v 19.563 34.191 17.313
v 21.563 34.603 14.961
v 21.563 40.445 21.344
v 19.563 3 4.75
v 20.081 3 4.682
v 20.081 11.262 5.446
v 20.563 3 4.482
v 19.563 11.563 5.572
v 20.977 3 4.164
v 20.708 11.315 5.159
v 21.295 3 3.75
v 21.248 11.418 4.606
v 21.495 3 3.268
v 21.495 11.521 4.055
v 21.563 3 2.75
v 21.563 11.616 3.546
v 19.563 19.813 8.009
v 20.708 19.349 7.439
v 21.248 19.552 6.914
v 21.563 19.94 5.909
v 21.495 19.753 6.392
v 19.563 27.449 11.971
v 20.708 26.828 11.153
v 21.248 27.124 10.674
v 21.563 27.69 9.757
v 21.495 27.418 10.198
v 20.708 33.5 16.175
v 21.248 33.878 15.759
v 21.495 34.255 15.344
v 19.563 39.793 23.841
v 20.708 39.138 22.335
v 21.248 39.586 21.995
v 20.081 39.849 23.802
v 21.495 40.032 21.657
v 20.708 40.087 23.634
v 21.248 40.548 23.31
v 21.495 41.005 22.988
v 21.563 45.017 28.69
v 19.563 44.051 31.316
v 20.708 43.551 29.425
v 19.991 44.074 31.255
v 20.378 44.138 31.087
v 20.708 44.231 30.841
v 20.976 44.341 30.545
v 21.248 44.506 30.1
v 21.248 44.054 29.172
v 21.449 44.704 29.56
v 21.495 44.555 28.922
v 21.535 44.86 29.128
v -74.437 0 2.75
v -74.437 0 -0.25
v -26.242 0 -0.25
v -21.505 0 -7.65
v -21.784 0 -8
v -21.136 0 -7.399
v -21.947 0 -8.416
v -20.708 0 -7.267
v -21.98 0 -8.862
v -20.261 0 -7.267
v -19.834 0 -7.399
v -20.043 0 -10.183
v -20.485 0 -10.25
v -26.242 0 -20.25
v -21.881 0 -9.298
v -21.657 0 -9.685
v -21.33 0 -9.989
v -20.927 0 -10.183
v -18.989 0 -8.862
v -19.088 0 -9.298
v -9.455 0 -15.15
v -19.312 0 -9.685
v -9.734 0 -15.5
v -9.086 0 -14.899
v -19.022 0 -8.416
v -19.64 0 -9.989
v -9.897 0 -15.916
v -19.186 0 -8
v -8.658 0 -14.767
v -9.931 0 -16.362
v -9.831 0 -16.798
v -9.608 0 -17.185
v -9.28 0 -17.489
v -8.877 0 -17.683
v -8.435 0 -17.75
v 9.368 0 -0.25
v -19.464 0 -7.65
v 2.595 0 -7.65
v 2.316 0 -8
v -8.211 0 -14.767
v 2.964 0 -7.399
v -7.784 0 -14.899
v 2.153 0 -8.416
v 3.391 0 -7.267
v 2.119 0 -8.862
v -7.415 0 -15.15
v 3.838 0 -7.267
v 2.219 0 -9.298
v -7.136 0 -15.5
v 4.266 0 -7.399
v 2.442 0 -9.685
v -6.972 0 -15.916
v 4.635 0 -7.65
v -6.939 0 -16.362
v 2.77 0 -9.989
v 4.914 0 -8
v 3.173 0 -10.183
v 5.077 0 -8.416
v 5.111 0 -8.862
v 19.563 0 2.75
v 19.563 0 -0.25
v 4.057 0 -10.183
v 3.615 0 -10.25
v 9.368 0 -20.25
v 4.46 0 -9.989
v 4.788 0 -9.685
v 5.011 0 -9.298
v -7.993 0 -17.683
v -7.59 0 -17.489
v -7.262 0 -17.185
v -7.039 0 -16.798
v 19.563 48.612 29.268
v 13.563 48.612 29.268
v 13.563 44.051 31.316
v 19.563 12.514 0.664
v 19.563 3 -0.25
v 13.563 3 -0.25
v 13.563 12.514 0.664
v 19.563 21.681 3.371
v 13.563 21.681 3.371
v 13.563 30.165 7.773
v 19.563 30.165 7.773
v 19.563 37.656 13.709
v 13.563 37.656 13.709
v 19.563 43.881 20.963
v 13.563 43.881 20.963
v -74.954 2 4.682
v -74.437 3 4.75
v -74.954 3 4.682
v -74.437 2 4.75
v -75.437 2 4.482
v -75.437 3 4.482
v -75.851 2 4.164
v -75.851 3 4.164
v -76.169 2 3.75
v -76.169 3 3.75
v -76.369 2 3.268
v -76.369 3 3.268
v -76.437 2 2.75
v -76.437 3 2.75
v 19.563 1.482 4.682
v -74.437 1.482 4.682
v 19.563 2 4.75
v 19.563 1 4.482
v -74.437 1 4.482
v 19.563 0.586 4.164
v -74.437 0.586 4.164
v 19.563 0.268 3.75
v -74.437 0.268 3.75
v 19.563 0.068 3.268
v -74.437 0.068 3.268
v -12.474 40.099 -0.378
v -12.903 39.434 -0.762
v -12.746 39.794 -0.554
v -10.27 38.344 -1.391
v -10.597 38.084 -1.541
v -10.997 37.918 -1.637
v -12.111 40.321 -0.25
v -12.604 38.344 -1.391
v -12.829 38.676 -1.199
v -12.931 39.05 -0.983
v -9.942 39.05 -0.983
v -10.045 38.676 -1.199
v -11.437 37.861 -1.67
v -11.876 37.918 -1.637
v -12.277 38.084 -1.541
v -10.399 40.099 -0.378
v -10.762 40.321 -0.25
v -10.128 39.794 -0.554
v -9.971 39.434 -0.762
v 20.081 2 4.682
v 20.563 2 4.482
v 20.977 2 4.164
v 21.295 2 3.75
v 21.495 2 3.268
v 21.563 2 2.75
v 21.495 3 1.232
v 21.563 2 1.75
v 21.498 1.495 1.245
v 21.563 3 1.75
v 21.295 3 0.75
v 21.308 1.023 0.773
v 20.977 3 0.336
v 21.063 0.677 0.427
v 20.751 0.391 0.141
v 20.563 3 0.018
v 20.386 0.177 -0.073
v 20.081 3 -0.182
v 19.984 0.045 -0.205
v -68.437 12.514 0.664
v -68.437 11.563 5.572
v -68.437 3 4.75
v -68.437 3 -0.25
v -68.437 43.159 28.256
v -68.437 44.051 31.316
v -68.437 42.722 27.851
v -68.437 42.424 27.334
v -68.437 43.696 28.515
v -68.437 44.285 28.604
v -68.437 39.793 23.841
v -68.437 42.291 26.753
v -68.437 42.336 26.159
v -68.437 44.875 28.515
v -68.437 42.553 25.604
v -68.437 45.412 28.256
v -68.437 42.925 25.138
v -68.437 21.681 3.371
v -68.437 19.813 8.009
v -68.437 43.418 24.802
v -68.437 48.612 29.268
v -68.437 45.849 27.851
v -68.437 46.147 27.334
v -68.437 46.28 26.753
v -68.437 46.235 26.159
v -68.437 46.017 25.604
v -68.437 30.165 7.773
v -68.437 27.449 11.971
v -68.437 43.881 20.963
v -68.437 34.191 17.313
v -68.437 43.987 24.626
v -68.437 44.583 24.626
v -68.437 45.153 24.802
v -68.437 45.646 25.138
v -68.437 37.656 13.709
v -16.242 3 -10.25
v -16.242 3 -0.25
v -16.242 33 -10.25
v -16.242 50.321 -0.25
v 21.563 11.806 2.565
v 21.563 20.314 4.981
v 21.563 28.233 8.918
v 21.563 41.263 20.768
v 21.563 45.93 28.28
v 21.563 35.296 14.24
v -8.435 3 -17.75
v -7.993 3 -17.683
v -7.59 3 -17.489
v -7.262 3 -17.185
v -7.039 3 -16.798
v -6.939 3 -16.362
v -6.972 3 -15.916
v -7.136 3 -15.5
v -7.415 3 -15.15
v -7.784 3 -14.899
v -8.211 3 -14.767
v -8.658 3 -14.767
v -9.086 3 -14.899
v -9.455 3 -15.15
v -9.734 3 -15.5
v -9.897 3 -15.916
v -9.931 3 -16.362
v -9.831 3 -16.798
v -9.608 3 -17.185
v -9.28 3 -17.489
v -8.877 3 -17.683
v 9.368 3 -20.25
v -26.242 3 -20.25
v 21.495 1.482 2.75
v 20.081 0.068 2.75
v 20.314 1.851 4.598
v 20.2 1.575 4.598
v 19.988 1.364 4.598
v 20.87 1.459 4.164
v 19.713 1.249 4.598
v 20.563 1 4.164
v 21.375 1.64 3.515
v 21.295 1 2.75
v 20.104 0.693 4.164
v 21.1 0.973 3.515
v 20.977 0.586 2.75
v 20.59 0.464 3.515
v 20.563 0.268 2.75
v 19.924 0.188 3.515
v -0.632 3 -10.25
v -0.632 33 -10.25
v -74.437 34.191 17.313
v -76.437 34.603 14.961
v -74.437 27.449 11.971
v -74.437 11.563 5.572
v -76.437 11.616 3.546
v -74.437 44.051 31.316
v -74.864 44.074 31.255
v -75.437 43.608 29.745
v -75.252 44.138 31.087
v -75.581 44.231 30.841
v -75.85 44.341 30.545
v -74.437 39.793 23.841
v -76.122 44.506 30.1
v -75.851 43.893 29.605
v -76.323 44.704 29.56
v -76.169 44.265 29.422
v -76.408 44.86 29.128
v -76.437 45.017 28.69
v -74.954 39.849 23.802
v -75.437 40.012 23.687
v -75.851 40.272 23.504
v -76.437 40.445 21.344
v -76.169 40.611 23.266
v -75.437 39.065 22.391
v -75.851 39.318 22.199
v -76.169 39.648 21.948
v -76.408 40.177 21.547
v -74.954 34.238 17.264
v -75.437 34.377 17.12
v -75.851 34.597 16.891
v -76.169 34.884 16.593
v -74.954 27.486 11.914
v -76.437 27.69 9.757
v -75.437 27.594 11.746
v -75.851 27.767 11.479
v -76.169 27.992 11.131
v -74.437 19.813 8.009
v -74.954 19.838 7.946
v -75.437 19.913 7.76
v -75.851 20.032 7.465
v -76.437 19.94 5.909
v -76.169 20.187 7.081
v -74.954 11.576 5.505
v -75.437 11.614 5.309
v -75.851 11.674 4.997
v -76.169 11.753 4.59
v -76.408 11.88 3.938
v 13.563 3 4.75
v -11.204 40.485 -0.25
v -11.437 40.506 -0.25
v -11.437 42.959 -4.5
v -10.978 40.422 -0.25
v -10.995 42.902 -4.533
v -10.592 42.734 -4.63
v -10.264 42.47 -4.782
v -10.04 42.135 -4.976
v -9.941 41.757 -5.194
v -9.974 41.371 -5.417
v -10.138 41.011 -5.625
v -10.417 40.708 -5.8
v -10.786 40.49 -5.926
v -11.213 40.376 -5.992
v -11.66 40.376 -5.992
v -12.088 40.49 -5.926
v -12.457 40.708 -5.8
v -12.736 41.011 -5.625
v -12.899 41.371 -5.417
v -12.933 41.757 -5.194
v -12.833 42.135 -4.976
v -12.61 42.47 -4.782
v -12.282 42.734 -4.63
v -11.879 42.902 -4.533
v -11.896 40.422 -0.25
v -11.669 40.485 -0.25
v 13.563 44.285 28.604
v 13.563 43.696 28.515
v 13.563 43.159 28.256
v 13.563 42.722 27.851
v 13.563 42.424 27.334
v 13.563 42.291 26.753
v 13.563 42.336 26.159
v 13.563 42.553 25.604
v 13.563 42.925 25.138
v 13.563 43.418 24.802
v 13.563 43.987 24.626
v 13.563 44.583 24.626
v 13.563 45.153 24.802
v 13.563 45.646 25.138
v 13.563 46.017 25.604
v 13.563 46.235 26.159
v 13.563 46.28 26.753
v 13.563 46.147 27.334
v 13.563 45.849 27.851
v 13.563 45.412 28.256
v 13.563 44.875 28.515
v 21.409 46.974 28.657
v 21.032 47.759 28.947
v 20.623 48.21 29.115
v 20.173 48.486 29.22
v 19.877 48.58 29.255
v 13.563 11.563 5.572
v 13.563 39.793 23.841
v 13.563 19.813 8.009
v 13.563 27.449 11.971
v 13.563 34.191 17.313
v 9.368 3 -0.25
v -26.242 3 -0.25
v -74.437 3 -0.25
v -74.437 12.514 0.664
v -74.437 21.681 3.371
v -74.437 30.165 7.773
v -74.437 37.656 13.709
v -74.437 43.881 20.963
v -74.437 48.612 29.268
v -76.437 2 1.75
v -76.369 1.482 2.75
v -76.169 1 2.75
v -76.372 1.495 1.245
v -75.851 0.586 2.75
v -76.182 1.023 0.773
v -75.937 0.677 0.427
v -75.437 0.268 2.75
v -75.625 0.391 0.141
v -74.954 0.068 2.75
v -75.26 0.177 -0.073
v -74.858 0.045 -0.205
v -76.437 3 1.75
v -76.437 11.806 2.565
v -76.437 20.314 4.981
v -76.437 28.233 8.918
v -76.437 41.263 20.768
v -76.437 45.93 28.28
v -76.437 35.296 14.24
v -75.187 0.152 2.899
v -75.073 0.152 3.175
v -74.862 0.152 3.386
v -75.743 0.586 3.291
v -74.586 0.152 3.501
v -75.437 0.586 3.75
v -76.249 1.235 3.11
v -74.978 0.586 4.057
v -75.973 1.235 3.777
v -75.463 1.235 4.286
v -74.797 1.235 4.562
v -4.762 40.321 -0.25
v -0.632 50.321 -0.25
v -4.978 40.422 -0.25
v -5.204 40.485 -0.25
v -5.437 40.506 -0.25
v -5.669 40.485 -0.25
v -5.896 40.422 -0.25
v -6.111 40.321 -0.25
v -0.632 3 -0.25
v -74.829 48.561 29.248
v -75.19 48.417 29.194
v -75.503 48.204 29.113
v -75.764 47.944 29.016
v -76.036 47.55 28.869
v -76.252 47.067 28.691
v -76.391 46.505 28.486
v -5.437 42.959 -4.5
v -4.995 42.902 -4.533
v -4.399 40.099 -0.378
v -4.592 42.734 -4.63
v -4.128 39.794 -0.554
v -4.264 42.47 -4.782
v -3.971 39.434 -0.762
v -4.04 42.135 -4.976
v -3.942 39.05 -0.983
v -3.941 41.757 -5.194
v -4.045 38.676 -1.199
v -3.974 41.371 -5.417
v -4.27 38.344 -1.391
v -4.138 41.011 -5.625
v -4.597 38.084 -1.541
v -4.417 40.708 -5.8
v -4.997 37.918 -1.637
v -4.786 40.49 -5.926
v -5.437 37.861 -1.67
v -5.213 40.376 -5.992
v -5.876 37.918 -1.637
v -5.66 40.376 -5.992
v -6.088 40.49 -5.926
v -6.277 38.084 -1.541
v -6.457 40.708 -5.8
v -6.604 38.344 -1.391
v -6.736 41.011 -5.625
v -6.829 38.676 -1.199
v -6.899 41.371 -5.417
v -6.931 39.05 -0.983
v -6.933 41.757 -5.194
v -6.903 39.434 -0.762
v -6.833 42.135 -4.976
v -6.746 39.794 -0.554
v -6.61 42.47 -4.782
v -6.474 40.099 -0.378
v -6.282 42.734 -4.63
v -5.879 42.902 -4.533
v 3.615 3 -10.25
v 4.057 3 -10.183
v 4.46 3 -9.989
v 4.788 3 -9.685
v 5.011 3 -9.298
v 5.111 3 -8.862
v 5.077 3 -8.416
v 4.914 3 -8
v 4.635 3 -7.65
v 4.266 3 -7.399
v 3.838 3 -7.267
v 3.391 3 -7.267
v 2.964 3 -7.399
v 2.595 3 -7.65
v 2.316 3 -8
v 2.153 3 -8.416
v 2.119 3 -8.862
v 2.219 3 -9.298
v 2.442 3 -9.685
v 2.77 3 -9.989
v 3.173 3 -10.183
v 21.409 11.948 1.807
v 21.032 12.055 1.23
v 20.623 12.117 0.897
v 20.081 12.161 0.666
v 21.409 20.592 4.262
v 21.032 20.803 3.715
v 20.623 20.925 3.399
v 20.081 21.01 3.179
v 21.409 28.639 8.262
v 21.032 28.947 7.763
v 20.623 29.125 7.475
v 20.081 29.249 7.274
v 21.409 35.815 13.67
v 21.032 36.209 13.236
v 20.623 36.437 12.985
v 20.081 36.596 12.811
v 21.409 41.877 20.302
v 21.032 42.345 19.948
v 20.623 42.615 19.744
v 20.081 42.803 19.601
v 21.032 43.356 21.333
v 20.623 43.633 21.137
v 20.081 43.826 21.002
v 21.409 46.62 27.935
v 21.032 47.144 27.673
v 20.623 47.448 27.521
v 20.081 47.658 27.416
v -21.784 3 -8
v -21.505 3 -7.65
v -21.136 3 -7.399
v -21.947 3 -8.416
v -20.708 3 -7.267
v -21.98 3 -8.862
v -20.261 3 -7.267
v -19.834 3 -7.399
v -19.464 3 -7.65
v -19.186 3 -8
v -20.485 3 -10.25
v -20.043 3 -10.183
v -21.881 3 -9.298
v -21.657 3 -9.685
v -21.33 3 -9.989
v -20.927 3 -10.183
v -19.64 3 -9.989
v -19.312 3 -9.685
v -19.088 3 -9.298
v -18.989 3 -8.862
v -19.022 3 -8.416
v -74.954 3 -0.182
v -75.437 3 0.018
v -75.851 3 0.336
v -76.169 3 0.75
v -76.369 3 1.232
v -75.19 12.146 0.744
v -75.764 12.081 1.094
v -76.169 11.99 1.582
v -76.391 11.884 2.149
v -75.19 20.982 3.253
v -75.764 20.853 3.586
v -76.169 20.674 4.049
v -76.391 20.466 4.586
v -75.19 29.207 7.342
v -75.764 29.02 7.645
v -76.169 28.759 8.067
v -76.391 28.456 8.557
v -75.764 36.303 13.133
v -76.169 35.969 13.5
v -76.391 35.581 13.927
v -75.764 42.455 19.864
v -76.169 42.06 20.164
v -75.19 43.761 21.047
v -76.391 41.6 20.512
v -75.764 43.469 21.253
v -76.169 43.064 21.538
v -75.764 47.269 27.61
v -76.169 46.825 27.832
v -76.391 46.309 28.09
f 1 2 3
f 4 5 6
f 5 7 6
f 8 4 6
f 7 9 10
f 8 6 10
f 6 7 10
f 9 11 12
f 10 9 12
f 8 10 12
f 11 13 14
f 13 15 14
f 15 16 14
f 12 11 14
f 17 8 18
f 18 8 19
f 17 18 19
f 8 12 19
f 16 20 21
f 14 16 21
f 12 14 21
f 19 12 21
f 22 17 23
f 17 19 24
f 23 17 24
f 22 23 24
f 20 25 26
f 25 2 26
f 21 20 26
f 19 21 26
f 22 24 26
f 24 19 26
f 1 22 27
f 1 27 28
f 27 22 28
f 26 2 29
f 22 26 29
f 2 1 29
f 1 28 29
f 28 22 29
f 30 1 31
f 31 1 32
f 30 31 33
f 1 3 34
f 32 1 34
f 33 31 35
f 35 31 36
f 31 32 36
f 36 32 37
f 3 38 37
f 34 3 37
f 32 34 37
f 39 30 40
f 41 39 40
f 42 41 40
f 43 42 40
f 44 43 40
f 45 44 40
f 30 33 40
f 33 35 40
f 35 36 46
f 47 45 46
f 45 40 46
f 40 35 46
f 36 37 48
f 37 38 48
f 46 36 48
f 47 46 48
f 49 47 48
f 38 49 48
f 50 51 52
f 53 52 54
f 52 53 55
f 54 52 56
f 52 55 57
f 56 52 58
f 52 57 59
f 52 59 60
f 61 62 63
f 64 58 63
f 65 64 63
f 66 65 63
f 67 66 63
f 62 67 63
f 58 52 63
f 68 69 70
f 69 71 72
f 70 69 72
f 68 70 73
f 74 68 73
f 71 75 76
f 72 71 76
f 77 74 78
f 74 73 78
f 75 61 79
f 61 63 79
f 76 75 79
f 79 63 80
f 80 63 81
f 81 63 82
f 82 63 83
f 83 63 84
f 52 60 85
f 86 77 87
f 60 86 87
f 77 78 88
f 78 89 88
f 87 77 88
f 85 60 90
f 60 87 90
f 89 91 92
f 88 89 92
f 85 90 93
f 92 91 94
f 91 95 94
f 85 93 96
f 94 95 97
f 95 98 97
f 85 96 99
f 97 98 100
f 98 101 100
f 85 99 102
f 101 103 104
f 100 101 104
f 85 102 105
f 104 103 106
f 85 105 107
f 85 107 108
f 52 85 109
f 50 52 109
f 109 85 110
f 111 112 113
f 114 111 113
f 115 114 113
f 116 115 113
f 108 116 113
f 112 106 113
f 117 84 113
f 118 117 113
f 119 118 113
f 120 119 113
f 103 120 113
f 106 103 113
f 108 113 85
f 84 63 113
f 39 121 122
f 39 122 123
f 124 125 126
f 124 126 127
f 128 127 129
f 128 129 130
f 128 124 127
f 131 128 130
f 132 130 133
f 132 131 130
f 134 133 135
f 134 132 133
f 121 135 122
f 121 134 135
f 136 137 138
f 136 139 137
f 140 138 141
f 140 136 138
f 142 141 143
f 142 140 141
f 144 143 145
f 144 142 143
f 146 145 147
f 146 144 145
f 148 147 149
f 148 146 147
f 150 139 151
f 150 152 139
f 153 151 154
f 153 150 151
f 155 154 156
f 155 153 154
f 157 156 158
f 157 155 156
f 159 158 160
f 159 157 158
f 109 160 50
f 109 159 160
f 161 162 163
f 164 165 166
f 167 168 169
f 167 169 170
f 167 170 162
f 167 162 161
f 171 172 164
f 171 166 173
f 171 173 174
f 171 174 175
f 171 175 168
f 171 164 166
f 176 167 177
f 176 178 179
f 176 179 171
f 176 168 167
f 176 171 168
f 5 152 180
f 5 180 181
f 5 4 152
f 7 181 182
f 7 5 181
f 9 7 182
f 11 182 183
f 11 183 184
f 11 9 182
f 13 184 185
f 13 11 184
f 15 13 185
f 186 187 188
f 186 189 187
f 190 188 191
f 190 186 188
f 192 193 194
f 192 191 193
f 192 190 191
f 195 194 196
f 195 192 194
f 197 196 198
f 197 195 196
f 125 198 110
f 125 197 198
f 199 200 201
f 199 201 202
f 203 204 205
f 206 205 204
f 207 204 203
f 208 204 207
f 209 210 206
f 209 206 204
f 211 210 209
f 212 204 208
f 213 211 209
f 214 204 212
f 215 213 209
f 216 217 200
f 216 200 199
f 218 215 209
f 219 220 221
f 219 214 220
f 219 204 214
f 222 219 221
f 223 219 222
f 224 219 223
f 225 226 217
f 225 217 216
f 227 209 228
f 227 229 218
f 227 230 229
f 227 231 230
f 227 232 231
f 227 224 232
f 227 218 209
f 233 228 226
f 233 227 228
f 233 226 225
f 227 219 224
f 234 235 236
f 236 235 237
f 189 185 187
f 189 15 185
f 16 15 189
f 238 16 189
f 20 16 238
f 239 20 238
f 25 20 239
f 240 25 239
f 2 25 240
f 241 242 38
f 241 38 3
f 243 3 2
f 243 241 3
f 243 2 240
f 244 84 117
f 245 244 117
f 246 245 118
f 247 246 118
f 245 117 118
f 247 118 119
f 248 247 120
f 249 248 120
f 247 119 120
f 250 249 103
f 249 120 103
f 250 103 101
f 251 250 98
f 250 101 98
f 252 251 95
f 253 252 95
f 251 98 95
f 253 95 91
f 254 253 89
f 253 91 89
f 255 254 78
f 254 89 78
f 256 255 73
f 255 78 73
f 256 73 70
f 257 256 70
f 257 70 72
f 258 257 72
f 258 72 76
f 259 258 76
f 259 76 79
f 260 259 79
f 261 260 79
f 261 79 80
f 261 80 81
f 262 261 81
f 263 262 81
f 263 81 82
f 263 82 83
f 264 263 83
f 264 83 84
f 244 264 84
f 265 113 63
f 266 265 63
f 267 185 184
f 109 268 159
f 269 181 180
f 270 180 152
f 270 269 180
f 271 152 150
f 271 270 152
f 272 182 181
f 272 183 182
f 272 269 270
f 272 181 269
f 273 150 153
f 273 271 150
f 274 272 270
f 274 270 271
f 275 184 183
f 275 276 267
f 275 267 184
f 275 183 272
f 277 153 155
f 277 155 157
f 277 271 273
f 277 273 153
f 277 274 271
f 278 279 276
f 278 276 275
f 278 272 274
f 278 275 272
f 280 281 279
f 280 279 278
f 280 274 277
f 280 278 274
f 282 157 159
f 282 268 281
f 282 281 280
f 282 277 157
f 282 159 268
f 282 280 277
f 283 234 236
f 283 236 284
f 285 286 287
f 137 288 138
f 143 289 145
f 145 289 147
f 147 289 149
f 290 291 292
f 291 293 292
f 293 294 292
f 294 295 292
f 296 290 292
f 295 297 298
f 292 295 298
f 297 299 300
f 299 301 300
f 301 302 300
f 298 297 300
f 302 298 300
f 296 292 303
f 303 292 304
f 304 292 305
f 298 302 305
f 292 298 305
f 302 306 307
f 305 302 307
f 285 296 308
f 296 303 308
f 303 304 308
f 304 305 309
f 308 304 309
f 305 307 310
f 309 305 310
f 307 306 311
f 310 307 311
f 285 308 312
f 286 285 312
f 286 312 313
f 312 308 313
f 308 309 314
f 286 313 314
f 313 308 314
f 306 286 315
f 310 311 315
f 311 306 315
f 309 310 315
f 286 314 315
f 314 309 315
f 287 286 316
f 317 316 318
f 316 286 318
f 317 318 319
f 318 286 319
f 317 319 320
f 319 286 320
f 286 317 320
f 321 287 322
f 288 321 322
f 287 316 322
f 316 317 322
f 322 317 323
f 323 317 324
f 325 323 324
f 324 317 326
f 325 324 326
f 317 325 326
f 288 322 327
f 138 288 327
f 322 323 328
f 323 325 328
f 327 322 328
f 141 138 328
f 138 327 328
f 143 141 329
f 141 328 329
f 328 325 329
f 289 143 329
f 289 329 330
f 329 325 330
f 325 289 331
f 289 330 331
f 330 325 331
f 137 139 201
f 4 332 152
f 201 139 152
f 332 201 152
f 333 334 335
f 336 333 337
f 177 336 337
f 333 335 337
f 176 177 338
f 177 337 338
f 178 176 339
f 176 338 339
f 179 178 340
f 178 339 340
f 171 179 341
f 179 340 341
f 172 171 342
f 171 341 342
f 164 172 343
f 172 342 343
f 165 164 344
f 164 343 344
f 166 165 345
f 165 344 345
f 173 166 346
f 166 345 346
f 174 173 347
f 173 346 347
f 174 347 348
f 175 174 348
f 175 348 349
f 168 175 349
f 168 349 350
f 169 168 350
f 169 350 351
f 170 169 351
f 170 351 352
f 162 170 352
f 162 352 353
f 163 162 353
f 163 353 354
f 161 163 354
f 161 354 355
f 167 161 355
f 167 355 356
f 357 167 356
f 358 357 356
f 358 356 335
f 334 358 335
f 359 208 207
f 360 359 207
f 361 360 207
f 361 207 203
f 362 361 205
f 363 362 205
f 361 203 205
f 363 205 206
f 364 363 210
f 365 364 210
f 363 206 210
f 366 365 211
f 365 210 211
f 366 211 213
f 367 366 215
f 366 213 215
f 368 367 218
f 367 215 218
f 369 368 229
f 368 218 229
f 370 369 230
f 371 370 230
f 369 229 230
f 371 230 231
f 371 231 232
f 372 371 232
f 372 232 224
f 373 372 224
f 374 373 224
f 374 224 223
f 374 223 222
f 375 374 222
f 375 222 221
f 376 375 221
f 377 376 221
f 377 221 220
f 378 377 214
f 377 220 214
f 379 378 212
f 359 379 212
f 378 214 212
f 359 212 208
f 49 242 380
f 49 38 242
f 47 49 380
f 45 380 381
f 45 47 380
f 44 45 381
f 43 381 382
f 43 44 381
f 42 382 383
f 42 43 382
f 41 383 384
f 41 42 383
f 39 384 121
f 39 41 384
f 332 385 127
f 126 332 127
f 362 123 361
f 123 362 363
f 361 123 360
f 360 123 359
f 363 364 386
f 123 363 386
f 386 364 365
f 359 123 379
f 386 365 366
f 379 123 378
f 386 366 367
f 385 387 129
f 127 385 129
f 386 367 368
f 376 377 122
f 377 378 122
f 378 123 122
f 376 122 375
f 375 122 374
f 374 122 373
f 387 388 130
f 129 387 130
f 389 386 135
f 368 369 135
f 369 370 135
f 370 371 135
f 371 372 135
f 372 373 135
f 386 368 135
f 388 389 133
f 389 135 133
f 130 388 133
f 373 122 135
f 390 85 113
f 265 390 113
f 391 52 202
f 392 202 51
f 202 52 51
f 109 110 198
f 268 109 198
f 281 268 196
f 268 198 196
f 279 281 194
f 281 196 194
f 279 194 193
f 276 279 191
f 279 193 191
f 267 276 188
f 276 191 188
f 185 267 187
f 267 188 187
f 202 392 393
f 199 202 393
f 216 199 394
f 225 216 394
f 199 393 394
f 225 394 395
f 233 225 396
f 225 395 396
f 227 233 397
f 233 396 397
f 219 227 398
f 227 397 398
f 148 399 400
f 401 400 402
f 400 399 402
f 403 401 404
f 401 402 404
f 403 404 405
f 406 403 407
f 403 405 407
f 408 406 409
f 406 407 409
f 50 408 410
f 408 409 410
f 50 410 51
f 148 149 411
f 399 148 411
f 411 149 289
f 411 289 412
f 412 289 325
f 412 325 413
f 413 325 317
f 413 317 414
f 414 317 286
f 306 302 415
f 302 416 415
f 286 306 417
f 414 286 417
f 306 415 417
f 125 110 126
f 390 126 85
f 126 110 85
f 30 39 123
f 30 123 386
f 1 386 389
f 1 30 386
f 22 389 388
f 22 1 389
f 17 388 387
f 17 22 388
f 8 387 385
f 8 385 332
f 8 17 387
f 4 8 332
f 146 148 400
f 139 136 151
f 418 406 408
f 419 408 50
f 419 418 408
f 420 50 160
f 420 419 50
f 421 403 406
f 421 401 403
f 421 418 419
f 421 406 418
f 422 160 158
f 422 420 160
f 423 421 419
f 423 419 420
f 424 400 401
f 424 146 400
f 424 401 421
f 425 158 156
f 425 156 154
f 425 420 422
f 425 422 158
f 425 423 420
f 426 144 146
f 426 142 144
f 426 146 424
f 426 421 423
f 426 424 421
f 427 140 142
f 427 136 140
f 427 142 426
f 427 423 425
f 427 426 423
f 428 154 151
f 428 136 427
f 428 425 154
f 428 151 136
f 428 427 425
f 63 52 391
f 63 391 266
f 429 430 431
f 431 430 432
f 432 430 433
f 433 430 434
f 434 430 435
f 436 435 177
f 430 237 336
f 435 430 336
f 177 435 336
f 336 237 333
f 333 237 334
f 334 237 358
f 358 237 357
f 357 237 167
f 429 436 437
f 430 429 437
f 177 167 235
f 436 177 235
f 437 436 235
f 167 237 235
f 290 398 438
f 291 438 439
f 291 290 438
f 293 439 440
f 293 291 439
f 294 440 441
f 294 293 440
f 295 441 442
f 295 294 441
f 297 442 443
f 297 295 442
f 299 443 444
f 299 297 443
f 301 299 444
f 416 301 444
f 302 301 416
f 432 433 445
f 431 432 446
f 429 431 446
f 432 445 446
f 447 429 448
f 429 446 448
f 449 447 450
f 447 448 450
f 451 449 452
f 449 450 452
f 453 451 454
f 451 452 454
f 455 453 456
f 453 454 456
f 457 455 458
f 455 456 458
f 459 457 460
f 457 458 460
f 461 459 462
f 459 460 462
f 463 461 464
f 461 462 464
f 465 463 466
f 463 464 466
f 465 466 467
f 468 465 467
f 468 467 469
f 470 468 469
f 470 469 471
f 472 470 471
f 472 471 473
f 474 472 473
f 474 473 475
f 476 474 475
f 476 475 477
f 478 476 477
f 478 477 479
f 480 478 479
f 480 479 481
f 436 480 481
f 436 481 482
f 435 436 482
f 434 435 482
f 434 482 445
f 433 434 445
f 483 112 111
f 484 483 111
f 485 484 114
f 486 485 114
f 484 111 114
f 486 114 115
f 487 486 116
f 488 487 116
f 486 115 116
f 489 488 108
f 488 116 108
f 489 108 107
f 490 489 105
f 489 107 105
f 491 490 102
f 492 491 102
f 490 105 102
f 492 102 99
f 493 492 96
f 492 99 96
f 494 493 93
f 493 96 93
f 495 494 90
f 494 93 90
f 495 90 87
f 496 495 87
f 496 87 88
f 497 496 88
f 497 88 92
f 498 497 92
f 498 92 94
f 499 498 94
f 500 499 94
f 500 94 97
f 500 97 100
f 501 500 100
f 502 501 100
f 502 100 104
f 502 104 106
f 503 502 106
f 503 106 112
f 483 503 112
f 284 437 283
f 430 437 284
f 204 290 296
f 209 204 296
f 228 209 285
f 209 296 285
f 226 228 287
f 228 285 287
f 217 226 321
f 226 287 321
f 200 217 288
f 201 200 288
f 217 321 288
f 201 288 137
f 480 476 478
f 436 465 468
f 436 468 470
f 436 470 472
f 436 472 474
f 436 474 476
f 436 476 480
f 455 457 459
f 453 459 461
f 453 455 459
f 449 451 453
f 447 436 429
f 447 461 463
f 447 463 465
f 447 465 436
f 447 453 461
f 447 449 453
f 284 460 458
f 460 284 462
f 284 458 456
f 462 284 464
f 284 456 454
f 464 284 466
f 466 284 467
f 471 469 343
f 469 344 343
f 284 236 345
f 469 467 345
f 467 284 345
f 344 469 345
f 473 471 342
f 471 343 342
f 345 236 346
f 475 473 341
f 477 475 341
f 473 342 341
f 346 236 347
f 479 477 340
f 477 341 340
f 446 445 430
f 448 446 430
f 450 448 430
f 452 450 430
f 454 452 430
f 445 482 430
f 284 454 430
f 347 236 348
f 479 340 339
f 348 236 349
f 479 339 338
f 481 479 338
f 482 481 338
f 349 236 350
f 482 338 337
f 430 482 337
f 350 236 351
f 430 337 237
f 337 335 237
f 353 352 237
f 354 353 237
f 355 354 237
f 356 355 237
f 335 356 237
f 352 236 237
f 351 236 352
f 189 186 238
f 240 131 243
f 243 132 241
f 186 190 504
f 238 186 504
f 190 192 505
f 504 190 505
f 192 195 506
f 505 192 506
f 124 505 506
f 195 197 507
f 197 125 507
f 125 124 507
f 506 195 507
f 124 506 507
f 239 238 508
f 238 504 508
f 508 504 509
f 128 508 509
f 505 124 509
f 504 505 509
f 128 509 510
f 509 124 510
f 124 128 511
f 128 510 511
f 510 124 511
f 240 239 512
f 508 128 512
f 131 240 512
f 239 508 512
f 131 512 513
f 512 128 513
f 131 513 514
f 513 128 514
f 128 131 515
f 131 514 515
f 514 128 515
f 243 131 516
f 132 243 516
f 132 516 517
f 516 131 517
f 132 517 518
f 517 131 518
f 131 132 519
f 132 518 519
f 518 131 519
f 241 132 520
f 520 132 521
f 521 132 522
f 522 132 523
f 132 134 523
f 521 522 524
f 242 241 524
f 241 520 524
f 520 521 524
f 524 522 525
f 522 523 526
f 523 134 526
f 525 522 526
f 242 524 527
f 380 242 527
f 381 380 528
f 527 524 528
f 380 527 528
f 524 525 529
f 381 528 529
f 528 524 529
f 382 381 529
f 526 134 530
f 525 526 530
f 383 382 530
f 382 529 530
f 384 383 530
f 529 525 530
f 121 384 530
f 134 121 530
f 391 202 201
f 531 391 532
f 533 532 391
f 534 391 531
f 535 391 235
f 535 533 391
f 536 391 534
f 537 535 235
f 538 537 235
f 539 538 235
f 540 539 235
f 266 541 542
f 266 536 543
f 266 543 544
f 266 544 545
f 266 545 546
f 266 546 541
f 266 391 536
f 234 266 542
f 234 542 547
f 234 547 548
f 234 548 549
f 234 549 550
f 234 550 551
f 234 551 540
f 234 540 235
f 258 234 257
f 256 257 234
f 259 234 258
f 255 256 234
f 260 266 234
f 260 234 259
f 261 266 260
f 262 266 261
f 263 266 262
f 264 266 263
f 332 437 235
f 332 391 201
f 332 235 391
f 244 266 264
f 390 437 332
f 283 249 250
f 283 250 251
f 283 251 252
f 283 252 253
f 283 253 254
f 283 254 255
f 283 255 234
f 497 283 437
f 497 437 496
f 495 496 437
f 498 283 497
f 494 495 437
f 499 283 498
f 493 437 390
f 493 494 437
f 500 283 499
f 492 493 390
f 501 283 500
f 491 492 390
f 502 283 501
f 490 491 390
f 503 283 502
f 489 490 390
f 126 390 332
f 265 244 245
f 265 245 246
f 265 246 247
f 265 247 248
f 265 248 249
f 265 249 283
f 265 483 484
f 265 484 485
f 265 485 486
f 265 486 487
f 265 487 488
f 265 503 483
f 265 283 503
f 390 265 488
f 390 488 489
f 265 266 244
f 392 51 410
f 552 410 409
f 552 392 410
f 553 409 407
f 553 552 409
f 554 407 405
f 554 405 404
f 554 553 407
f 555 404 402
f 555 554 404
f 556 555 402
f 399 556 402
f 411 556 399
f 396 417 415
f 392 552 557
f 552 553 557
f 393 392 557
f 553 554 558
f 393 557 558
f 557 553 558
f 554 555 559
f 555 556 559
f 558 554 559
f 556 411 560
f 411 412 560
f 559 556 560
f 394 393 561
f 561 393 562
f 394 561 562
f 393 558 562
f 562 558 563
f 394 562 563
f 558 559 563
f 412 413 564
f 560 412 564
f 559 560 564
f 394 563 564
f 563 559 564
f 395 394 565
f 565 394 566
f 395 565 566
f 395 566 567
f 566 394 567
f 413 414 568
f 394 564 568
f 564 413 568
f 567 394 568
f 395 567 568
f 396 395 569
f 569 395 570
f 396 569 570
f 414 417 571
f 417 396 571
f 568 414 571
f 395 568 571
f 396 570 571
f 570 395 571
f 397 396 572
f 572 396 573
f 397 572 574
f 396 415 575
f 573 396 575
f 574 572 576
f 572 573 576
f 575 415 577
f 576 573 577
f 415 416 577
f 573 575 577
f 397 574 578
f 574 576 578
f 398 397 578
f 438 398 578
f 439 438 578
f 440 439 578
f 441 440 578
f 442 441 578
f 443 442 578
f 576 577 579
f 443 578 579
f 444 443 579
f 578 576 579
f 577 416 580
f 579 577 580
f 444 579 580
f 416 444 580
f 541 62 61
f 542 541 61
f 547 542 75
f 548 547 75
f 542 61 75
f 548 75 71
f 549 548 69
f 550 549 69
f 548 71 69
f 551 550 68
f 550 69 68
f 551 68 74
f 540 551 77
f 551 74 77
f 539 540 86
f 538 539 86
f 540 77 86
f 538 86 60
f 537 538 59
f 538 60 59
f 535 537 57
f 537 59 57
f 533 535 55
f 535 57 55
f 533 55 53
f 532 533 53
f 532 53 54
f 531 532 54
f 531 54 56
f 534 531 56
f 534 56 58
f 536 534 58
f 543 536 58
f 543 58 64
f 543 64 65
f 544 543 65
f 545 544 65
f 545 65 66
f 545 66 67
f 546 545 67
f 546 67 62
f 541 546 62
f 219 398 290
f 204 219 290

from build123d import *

# Parameters (mm, degrees)
SKETCH1_W           = 17.805
SKETCH1_H           = 20
SKETCH1_W_2         = 38
SKETCH1_H_2         = 5
BOSS_EXTRUDE1_DEPTH = 3
SKETCH3_R           = 1.5
CUT_EXTRUDE1_DEPTH  = 5
SKETCH7_W           = 15.61
SKETCH7_H           = 10
BOSS_EXTRUDE4_DEPTH = 30
BOSS_EXTRUDE5_DEPTH = 15.61
SKETCH9_R           = 1.5
CUT_EXTRUDE2_DEPTH  = 5
BOSS_EXTRUDE6_DEPTH = 8
FILLET4_R           = 2
SKETCH10_R          = 2
BOSS_EXTRUDE7_DEPTH = 82


with BuildPart() as part:
    # Sketch1 → Boss-Extrude1 (new body)
    with BuildSketch(Plane(origin=(0, 0, 0), x_dir=(1, 0, 0), z_dir=(0, 1, 0))):
        Polygon((9.368218391, 0.25), (-8.436781609, 0.25), (-26.241781609, 0.25), (-38.436781609, 0.25), (-38.436781609, -4.75), (21.563218391, -4.75), (21.563218391, 0.25), align=None)
        with Locations((0.465718391, 10.25)):
            Rectangle(SKETCH1_W, SKETCH1_H)
        with Locations((-17.339281609, 10.25)):
            Rectangle(SKETCH1_W, SKETCH1_H)
        with Locations((-57.436781609, -2.25)):
            Rectangle(SKETCH1_W_2, SKETCH1_H_2)
    extrude(amount=BOSS_EXTRUDE1_DEPTH)

    # Sketch3 → Cut-Extrude1 (cut)
    with BuildSketch(Plane.XZ):
        with Locations(Location((-20.484687418, -8.75, 0), (0, 0, 270))):
            Circle(SKETCH3_R)
        with Locations(Location((-8.434877213, -16.25, 0), (0, 0, 270))):
            Circle(SKETCH3_R)
        with Locations(Location((3.614932992, -8.75, 0), (0, 0, 270))):
            Circle(SKETCH3_R)
    extrude(amount=-CUT_EXTRUDE1_DEPTH, mode=Mode.SUBTRACT)

    # Sketch7 → Boss-Extrude4 (add)
    with BuildSketch(Plane(origin=(0, 3, 0), x_dir=(1, 0, 0), z_dir=(0, 1, 0))):
        with Locations((-8.436781609, 5.25)):
            Rectangle(SKETCH7_W, SKETCH7_H)
    extrude(amount=BOSS_EXTRUDE4_DEPTH)

    # Sketch8 → Boss-Extrude5 (add)
    with BuildSketch(Plane.ZY.offset(16.241781609)):
        Polygon((-10.25, 33), (-0.25, 50.320508076), (-0.25, 33), align=None)
    extrude(amount=-BOSS_EXTRUDE5_DEPTH)

    # Sketch9 → Cut-Extrude2 (cut)
    with BuildSketch(Plane(origin=(0, 12.688380194, -21.976919162), x_dir=(1, 0, 0), z_dir=(0, 0.4999999999999978, -0.8660254037844399))):
        with Locations(Location((-11.436781609, -33.453838325, 0), (0, 0, 270))):
            Circle(SKETCH9_R)
        with Locations(Location((-5.436781609, -33.453838325, 0), (0, 0, 270))):
            Circle(SKETCH9_R)
    extrude(amount=-CUT_EXTRUDE2_DEPTH, mode=Mode.SUBTRACT)

    # Sketch2 → Boss-Extrude6 (add)
    with BuildSketch(Plane(origin=(21.563218391, 0, 0), x_dir=(0, 0, -1), z_dir=(1, 0, 0))):
        with BuildLine():
            Line((-29.267799241, 48.612273042), (-31.316019317, 44.051045738))
            ThreePointArc((-31.316019317, 44.051045738), (-11.97084483, 27.448628481), (-4.75, 3))
            Line((-4.75, 3), (0.25, 3))
            ThreePointArc((0.25, 3), (-7.773160922, 30.165142757), (-29.267799241, 48.612273042))
        make_face()
    boss_extrude6 = extrude(amount=-BOSS_EXTRUDE6_DEPTH)

    # Mirror1: Boss-Extrude6 across plane
    add(boss_extrude6.mirror(Plane.ZY.offset(27.436781609)))

    # Fillet4
    fillet4_edges = [part.edges().sort_by_distance(p)[0] for p in [
        (-76.436781609, 27.448628481, 11.97084483),
        (-76.436781609, 30.165142757, 7.773160922),
        (-76.436781609, 46.33165939, 30.291909279),
        (21.563218391, 0, 2.25),
        (21.563218391, 1.5, 4.75),
        (21.563218391, 1.5, -0.25),
        (-76.436781609, 1.5, -0.25),
        (-76.436781609, 1.5, 4.75),
        (-76.436781609, 0, 2.25),
        (21.563218391, 27.448628481, 11.97084483),
        (-27.436781609, 0, 4.75),
        (21.563218391, 30.165142757, 7.773160922),
        (21.563218391, 46.33165939, 30.291909279),
    ]]
    fillet(fillet4_edges, radius=FILLET4_R)

    # Sketch10 → Boss-Extrude7 (add)
    with BuildSketch(Plane(origin=(-68.436781609, 0, 0), x_dir=(0, 0, -1), z_dir=(1, 0, 0))):
        with Locations(Location((-26.603637459, 44.285402207, 0), (0, 0, 180))):
            Circle(SKETCH10_R)
    extrude(amount=BOSS_EXTRUDE7_DEPTH)


solid = part.part
